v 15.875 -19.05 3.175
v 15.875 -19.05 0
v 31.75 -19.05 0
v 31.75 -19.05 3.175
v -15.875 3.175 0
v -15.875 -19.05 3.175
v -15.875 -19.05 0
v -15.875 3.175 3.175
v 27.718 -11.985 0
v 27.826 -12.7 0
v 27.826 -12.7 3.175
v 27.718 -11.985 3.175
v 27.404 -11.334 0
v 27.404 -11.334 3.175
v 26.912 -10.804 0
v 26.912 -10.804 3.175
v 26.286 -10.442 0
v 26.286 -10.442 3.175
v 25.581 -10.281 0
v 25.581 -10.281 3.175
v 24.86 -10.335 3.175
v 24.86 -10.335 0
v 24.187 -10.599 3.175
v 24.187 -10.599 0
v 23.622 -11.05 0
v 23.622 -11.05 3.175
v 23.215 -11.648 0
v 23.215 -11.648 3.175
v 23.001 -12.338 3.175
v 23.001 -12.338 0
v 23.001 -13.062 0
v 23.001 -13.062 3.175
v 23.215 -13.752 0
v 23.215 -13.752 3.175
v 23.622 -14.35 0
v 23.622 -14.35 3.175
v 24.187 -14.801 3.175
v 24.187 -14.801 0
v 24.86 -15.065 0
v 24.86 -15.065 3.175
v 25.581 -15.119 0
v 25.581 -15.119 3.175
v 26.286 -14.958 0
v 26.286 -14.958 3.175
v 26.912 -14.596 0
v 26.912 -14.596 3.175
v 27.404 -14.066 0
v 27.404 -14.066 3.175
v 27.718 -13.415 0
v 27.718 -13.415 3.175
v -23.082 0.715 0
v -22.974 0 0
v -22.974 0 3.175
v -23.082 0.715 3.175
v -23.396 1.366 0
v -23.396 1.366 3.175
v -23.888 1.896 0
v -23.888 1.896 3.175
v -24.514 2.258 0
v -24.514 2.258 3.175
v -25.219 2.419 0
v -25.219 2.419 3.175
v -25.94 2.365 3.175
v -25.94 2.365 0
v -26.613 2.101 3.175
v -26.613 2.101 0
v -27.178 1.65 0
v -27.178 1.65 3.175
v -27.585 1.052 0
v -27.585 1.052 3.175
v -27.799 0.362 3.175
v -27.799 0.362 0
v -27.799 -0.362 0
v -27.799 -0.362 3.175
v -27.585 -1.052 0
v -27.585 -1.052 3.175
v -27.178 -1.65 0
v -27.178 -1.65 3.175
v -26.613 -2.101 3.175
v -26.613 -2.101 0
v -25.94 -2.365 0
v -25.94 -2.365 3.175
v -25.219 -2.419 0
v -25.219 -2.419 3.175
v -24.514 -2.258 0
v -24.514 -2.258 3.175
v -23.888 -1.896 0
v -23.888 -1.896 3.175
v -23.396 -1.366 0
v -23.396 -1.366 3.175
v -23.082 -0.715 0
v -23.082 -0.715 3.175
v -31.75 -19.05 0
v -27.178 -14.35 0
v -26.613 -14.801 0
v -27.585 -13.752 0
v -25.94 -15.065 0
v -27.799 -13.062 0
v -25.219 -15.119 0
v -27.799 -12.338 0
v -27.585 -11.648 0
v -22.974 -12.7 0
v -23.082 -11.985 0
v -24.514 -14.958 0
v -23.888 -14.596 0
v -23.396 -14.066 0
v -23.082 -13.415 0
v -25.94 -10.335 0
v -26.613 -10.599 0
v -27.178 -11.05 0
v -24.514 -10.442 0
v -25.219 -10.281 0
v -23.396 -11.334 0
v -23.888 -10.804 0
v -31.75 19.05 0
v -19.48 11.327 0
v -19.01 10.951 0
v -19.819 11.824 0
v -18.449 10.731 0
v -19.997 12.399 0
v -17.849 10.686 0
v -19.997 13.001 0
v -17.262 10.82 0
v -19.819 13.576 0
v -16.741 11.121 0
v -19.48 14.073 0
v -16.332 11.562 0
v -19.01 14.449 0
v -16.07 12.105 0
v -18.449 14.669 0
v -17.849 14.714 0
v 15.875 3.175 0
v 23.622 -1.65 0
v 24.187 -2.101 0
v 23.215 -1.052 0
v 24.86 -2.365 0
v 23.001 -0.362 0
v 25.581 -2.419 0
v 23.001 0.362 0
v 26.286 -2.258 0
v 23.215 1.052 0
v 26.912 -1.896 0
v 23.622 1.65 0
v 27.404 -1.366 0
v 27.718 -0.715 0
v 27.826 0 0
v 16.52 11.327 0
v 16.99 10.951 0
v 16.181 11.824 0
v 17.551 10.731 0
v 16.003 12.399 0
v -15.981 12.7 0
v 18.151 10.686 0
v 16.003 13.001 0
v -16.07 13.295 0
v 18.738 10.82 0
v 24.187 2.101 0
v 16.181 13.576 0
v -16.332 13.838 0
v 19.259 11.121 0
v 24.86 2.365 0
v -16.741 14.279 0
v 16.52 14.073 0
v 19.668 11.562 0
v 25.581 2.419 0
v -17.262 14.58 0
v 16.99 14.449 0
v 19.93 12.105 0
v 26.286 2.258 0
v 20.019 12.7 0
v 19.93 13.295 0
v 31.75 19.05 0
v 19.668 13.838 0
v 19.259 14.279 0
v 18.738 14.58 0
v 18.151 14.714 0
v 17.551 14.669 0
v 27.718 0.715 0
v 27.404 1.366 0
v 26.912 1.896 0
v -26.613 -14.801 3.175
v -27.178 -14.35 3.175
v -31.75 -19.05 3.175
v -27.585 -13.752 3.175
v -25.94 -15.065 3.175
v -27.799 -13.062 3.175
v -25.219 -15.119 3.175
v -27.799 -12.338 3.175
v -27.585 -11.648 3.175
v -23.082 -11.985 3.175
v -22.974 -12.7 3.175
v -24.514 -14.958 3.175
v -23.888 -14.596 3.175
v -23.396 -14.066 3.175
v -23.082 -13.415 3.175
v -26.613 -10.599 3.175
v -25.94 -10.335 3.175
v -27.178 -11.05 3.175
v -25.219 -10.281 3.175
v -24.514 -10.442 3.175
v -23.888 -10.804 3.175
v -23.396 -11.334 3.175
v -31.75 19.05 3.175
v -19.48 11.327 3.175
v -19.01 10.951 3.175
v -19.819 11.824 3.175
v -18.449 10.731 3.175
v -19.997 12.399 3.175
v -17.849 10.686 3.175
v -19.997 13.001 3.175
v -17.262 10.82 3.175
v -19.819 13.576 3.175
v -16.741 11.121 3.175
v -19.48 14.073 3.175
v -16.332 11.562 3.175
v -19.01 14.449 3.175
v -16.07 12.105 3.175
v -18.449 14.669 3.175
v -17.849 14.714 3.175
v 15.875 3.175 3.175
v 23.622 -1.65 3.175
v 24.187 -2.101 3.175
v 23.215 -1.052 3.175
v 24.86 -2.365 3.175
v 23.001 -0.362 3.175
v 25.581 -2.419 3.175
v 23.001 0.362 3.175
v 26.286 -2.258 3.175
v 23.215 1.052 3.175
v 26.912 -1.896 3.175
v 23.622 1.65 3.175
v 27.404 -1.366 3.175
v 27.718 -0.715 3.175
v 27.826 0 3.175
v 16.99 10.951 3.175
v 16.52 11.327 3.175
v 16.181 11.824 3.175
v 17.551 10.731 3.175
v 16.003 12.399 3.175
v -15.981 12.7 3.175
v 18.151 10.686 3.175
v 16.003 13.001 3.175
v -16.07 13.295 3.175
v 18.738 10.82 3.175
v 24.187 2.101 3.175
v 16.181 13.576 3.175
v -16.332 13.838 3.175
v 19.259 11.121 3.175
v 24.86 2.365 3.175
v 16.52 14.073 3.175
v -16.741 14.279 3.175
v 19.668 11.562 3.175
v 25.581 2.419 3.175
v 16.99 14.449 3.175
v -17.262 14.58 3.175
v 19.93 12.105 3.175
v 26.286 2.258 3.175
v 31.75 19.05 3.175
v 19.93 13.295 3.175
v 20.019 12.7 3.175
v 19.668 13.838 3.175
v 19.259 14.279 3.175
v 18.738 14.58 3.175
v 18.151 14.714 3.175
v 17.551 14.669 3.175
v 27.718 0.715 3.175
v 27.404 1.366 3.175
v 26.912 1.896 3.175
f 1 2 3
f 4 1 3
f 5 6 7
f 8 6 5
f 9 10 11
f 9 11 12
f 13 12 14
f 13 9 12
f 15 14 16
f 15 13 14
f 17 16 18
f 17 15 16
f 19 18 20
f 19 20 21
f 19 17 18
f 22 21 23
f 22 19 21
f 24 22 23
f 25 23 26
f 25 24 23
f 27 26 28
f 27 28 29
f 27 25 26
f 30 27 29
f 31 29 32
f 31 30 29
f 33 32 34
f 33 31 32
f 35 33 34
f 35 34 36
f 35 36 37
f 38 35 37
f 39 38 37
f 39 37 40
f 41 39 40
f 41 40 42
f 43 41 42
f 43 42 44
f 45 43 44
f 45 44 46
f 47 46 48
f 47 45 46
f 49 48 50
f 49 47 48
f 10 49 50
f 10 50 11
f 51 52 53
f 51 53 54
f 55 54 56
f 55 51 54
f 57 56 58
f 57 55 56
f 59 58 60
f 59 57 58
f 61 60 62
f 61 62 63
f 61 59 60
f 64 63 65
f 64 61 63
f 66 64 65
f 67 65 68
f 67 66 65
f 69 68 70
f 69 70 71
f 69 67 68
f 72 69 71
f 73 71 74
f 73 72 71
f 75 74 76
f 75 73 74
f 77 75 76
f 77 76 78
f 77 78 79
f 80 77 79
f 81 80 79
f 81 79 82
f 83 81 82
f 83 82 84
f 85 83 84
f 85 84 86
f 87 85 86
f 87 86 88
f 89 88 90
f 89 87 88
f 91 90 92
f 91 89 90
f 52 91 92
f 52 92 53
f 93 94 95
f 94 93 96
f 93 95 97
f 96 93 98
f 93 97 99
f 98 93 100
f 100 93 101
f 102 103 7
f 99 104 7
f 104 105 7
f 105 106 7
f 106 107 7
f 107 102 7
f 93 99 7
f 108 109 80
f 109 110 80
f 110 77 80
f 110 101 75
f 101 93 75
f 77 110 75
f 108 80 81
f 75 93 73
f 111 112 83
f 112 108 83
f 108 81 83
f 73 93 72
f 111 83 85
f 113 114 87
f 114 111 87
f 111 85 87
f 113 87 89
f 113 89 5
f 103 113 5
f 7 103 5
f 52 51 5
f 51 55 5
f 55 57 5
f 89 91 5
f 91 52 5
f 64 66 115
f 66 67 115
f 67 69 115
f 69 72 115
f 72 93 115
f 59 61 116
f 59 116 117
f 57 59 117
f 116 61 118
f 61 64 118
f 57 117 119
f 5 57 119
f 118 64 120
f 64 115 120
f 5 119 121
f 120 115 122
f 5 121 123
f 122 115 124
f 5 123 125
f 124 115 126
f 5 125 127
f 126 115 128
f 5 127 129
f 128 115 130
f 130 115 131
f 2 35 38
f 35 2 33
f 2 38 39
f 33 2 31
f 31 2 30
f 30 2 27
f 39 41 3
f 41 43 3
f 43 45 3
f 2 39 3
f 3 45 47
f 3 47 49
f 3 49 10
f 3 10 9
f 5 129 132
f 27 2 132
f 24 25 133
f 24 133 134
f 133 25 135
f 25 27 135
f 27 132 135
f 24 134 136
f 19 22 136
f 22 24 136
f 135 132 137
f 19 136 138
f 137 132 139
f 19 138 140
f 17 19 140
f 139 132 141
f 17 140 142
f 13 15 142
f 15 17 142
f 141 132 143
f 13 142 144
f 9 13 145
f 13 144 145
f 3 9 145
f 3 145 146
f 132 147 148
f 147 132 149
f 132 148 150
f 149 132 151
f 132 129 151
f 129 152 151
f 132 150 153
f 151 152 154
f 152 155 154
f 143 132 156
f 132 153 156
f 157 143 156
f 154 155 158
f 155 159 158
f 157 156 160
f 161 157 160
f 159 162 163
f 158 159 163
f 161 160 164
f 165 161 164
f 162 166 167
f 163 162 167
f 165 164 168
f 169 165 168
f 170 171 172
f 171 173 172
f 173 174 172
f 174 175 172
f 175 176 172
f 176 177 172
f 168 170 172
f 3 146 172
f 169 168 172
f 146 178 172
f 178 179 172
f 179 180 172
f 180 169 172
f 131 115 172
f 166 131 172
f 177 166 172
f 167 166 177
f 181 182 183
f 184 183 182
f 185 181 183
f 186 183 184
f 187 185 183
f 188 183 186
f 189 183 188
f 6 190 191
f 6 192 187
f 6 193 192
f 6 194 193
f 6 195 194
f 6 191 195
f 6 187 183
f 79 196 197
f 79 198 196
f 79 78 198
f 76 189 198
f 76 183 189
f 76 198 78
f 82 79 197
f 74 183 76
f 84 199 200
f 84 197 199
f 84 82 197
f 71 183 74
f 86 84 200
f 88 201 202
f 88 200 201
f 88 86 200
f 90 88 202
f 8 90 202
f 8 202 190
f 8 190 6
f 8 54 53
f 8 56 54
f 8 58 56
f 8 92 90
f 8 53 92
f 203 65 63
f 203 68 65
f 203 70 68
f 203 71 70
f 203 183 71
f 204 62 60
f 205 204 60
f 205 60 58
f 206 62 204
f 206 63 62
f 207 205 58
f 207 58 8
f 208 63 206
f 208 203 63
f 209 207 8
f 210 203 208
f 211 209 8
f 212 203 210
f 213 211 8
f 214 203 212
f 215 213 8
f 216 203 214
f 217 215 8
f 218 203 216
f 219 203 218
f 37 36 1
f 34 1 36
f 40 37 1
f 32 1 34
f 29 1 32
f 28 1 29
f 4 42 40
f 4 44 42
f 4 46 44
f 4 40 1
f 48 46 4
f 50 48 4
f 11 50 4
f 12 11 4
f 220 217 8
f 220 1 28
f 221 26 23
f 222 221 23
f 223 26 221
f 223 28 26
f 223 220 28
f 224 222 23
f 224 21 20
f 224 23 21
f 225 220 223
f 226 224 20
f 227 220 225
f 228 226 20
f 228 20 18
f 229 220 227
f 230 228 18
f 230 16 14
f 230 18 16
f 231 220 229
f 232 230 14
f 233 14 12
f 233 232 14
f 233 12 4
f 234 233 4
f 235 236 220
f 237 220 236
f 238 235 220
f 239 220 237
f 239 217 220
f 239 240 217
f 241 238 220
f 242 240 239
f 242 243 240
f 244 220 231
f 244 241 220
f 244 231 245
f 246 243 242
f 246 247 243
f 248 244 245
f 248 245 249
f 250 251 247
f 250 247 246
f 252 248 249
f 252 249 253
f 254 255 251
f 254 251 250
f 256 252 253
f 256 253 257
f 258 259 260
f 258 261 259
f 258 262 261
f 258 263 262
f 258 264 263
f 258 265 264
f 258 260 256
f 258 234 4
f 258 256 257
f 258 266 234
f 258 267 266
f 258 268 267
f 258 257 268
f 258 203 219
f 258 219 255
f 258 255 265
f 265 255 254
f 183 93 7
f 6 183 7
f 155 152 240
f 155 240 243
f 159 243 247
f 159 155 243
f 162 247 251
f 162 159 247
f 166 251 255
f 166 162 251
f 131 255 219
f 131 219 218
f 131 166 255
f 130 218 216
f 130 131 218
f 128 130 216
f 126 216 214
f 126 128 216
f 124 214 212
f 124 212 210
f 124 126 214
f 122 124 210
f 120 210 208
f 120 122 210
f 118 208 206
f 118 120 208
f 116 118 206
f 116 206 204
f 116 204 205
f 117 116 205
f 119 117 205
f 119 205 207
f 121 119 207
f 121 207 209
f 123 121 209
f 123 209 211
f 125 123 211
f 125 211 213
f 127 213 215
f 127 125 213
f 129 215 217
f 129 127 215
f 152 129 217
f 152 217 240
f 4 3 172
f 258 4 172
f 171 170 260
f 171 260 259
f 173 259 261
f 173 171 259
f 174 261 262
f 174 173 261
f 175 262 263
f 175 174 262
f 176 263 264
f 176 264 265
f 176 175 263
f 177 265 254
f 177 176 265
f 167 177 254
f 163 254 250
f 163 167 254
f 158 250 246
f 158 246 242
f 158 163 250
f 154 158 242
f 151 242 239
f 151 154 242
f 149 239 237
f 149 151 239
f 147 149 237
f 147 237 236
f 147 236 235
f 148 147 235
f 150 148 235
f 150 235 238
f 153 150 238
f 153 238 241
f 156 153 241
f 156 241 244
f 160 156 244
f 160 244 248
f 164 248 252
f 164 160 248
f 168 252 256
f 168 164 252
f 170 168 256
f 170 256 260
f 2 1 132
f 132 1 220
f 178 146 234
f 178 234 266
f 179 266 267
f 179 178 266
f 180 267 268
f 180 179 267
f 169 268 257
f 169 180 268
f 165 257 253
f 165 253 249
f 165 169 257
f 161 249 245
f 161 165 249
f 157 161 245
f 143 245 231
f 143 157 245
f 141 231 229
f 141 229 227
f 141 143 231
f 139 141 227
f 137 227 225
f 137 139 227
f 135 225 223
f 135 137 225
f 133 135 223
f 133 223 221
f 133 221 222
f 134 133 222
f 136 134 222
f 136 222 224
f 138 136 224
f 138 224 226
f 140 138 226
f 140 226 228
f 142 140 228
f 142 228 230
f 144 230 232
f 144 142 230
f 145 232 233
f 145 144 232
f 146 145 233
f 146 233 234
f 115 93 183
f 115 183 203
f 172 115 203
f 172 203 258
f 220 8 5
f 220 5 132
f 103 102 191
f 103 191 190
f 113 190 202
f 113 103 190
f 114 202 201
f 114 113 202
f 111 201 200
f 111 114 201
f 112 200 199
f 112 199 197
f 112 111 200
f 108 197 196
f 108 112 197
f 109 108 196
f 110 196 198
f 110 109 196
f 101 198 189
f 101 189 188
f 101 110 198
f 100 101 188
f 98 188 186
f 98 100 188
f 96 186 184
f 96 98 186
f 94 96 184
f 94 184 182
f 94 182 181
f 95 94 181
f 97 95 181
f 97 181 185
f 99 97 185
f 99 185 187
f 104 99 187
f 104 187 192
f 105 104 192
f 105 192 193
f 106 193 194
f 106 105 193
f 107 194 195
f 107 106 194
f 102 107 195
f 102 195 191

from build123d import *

# Parameters (mm, degrees)
F0_W     = 63.5
F0_H     = 38.1
F0_R     = 2.4257
F0_R_2   = 2.0193
F1_DEPTH = 3.175
F2_W     = 31.75
F2_H     = 22.225
F3_DEPTH = 3.176


with BuildPart() as f1:
    # F0 (on Top) → F1 (new body)
    with BuildSketch(Plane.XY):
        Rectangle(F0_W, F0_H)
        with Locations((-25.4, -12.7)):
            Circle(F0_R, mode=Mode.SUBTRACT)
        with Locations((25.4, -12.7)):
            Circle(F0_R, mode=Mode.SUBTRACT)
        with Locations((-25.4, 0)):
            Circle(F0_R, mode=Mode.SUBTRACT)
        with Locations((-18, 12.7)):
            Circle(F0_R_2, mode=Mode.SUBTRACT)
        with Locations((25.4, 0)):
            Circle(F0_R, mode=Mode.SUBTRACT)
        with Locations((18, 12.7)):
            Circle(F0_R_2, mode=Mode.SUBTRACT)
    extrude(amount=F1_DEPTH)

    # F2 (on face) → F3 (cut, through all)
    with BuildSketch(Plane.XY.offset(3.175)):
        with Locations((0, -7.9375)):
            Rectangle(F2_W, F2_H)
    extrude(amount=-F3_DEPTH, mode=Mode.SUBTRACT)


solid = f1.part
